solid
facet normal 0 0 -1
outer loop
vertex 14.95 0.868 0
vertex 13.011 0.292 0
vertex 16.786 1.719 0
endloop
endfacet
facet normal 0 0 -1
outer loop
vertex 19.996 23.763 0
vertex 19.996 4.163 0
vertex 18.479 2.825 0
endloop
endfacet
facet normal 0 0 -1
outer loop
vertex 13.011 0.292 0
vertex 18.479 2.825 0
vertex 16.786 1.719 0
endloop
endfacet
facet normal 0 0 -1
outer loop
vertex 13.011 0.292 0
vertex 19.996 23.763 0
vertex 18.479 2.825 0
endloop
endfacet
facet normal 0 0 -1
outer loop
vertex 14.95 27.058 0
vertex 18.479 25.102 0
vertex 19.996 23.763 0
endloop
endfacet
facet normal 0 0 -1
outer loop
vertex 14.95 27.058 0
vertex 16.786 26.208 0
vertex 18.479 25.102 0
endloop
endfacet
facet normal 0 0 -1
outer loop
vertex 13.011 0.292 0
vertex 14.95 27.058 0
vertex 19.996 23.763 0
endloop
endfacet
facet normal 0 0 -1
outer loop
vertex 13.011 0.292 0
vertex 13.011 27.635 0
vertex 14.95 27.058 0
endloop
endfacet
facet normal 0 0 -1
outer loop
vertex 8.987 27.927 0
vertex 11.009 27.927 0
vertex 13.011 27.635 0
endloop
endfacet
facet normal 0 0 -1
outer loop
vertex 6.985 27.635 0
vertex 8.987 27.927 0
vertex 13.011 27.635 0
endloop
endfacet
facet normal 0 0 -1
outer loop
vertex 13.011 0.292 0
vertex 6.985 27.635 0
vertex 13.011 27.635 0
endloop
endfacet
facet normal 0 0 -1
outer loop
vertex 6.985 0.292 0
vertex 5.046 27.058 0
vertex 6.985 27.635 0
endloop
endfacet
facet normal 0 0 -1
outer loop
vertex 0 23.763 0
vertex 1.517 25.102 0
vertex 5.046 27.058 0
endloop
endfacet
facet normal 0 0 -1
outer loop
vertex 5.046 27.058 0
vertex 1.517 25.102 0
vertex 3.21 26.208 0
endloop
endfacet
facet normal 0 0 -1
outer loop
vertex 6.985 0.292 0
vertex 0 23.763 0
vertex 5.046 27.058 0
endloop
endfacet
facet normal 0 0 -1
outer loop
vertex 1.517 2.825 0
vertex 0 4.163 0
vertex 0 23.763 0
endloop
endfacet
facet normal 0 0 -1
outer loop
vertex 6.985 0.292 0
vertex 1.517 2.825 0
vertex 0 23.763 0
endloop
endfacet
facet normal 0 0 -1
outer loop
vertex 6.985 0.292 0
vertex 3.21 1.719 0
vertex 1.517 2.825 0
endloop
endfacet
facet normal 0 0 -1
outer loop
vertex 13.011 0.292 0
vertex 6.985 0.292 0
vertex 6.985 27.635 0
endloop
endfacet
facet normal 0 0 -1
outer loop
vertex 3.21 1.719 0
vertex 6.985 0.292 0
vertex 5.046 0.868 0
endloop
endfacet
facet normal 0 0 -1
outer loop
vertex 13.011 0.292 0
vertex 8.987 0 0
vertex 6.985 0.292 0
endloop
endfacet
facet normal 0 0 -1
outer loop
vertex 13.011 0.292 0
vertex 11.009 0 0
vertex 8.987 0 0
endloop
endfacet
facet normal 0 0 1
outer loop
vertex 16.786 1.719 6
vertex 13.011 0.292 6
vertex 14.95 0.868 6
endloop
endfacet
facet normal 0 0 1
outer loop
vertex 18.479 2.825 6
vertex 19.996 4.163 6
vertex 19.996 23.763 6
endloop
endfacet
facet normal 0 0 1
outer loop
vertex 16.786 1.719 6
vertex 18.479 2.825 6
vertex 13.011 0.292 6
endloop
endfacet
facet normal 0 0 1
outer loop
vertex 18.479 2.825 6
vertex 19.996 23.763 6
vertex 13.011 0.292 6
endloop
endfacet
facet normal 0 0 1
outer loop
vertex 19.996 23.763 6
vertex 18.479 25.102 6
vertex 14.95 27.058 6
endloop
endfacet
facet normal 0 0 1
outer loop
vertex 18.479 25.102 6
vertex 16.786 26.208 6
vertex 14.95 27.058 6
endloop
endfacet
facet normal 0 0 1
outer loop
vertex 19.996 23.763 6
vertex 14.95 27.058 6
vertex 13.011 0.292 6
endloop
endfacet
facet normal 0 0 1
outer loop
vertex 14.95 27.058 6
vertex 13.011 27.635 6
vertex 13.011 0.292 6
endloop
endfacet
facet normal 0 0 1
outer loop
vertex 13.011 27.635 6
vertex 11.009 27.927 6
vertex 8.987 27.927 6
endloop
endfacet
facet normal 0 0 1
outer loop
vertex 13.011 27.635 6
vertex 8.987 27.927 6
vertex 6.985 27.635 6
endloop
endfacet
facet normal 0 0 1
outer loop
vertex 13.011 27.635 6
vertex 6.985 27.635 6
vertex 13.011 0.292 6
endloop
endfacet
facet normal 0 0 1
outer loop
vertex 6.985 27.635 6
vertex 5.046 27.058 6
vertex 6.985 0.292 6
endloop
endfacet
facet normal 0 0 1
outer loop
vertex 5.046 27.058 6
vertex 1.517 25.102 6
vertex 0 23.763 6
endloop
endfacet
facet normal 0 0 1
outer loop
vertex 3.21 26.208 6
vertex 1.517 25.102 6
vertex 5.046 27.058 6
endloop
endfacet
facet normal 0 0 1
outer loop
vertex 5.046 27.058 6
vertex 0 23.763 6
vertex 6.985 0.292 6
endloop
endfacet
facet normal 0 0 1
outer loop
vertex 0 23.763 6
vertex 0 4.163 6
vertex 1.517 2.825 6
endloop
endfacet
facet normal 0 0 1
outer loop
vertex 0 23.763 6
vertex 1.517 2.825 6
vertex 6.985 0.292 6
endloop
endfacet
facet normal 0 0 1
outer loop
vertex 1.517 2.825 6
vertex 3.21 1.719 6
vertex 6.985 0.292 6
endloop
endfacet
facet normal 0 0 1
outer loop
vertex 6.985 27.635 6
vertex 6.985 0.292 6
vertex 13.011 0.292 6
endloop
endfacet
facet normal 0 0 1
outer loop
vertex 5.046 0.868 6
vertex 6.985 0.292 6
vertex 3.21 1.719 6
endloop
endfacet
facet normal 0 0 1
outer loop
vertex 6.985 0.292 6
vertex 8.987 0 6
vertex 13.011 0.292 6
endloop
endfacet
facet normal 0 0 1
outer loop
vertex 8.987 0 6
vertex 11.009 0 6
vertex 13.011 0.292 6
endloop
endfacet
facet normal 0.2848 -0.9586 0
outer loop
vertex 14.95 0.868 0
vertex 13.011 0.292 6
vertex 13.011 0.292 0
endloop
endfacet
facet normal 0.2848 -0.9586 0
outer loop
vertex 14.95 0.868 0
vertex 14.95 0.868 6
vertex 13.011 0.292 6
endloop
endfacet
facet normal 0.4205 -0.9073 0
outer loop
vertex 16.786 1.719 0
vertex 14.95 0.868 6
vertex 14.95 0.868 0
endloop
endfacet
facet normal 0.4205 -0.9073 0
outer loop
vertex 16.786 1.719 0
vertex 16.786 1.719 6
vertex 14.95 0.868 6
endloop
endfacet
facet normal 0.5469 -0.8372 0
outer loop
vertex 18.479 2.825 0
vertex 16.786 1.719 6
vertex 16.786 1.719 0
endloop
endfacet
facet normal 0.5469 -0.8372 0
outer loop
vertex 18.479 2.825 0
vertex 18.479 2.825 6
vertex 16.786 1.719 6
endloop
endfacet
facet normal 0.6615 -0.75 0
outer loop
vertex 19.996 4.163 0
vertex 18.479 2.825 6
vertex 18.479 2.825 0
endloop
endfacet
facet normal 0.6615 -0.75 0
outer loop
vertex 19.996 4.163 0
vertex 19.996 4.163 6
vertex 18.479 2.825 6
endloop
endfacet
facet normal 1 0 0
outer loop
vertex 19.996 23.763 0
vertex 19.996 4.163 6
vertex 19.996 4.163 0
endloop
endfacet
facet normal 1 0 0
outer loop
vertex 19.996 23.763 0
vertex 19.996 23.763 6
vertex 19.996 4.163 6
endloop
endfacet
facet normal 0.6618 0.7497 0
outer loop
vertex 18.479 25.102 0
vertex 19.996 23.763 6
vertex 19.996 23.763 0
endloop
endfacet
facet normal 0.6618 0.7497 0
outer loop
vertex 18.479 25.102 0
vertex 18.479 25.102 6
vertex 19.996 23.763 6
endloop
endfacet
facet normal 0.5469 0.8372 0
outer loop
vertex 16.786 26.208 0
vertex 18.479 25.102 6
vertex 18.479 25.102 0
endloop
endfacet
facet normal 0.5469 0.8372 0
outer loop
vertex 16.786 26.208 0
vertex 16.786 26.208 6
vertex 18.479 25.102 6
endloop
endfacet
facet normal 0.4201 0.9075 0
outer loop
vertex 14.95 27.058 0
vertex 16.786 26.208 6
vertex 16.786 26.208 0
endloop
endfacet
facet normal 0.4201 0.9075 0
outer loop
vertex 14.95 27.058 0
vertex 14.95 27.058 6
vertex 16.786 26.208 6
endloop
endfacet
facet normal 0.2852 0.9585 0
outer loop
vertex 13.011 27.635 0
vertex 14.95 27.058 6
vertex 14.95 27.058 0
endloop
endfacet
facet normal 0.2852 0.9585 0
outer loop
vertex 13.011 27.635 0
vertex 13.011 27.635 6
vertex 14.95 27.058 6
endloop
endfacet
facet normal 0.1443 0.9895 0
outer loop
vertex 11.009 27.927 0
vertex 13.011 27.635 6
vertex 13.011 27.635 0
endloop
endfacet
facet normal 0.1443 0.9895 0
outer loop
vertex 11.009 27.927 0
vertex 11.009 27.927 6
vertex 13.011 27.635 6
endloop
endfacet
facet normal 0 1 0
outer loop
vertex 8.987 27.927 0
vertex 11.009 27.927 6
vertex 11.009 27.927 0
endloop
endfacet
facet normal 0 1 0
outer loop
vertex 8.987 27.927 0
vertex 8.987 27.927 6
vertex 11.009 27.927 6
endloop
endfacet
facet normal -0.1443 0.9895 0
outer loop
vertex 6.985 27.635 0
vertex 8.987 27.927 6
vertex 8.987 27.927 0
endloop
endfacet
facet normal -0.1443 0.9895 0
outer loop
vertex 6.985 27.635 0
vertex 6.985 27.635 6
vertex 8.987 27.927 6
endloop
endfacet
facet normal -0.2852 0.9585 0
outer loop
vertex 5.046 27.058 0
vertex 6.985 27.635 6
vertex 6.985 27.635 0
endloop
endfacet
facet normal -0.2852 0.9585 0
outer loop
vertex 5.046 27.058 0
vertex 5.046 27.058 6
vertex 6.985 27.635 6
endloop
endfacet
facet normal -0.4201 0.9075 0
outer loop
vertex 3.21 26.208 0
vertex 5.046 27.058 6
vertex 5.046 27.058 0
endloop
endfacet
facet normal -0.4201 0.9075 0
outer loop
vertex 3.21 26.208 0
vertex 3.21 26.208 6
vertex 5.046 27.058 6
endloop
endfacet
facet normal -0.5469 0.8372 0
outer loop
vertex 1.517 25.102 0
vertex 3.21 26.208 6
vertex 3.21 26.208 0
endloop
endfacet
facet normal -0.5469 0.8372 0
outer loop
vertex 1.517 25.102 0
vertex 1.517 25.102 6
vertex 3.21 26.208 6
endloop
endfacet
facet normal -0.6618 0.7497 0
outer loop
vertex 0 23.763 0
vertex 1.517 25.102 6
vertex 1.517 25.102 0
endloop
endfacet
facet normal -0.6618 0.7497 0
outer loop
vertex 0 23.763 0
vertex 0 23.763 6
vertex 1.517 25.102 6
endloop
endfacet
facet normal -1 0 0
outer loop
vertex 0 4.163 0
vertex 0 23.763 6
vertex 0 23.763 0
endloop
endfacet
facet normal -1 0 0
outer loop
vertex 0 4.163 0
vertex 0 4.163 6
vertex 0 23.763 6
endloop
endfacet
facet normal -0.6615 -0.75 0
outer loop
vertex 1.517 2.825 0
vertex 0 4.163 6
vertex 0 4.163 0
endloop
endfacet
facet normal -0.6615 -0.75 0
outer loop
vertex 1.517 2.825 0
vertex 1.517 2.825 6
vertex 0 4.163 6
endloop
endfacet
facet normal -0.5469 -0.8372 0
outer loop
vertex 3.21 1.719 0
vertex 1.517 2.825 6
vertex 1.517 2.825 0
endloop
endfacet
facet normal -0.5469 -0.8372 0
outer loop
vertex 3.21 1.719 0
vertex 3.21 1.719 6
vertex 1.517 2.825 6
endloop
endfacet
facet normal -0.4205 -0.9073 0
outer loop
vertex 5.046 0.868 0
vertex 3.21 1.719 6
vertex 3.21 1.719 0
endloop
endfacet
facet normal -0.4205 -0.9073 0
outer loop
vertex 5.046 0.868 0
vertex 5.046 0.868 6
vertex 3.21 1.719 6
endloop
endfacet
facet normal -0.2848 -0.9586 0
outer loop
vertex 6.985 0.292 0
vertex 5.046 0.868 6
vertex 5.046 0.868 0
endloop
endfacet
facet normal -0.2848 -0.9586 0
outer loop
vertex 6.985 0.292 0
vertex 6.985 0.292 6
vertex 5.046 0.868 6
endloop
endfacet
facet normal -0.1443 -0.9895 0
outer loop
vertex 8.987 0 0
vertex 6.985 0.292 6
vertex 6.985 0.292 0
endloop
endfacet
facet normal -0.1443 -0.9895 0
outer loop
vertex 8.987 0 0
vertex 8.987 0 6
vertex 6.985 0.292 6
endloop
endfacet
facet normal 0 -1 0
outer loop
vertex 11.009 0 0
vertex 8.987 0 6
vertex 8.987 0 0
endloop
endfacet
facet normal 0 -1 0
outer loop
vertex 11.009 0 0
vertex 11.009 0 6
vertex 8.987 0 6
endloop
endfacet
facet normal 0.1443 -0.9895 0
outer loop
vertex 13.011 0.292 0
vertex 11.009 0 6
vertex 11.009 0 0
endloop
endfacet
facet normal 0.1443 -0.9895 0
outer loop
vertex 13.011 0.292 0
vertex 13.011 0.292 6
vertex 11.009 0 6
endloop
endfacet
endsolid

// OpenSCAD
$fn = 32;

// ----------------------------------------------------------------------
// Eccentric disc: double_d, 6 mm thick
// ----------------------------------------------------------------------

// --- parameters (mm) ---
profile_height = 6;       // extrusion height
profile_points = 24;      // points of the closed outline

profile = [[19.996, 23.763], [18.479, 25.102], [16.786, 26.208], [14.95, 27.058], [13.011, 27.635], [11.009, 27.927], [8.987, 27.927], [6.985, 27.635], [5.046, 27.058], [3.21, 26.208], [1.517, 25.102], [0, 23.763], [0, 4.163], [1.517, 2.825], [3.21, 1.719], [5.046, 0.868], [6.985, 0.292], [8.987, 0], [11.009, 0], [13.011, 0.292], [14.95, 0.868], [16.786, 1.719], [18.479, 2.825], [19.996, 4.163]];  // single closed polygon, 24 points, counter clockwise

// --- the one profile operation ---
linear_extrude(height = profile_height) polygon(points = profile);
